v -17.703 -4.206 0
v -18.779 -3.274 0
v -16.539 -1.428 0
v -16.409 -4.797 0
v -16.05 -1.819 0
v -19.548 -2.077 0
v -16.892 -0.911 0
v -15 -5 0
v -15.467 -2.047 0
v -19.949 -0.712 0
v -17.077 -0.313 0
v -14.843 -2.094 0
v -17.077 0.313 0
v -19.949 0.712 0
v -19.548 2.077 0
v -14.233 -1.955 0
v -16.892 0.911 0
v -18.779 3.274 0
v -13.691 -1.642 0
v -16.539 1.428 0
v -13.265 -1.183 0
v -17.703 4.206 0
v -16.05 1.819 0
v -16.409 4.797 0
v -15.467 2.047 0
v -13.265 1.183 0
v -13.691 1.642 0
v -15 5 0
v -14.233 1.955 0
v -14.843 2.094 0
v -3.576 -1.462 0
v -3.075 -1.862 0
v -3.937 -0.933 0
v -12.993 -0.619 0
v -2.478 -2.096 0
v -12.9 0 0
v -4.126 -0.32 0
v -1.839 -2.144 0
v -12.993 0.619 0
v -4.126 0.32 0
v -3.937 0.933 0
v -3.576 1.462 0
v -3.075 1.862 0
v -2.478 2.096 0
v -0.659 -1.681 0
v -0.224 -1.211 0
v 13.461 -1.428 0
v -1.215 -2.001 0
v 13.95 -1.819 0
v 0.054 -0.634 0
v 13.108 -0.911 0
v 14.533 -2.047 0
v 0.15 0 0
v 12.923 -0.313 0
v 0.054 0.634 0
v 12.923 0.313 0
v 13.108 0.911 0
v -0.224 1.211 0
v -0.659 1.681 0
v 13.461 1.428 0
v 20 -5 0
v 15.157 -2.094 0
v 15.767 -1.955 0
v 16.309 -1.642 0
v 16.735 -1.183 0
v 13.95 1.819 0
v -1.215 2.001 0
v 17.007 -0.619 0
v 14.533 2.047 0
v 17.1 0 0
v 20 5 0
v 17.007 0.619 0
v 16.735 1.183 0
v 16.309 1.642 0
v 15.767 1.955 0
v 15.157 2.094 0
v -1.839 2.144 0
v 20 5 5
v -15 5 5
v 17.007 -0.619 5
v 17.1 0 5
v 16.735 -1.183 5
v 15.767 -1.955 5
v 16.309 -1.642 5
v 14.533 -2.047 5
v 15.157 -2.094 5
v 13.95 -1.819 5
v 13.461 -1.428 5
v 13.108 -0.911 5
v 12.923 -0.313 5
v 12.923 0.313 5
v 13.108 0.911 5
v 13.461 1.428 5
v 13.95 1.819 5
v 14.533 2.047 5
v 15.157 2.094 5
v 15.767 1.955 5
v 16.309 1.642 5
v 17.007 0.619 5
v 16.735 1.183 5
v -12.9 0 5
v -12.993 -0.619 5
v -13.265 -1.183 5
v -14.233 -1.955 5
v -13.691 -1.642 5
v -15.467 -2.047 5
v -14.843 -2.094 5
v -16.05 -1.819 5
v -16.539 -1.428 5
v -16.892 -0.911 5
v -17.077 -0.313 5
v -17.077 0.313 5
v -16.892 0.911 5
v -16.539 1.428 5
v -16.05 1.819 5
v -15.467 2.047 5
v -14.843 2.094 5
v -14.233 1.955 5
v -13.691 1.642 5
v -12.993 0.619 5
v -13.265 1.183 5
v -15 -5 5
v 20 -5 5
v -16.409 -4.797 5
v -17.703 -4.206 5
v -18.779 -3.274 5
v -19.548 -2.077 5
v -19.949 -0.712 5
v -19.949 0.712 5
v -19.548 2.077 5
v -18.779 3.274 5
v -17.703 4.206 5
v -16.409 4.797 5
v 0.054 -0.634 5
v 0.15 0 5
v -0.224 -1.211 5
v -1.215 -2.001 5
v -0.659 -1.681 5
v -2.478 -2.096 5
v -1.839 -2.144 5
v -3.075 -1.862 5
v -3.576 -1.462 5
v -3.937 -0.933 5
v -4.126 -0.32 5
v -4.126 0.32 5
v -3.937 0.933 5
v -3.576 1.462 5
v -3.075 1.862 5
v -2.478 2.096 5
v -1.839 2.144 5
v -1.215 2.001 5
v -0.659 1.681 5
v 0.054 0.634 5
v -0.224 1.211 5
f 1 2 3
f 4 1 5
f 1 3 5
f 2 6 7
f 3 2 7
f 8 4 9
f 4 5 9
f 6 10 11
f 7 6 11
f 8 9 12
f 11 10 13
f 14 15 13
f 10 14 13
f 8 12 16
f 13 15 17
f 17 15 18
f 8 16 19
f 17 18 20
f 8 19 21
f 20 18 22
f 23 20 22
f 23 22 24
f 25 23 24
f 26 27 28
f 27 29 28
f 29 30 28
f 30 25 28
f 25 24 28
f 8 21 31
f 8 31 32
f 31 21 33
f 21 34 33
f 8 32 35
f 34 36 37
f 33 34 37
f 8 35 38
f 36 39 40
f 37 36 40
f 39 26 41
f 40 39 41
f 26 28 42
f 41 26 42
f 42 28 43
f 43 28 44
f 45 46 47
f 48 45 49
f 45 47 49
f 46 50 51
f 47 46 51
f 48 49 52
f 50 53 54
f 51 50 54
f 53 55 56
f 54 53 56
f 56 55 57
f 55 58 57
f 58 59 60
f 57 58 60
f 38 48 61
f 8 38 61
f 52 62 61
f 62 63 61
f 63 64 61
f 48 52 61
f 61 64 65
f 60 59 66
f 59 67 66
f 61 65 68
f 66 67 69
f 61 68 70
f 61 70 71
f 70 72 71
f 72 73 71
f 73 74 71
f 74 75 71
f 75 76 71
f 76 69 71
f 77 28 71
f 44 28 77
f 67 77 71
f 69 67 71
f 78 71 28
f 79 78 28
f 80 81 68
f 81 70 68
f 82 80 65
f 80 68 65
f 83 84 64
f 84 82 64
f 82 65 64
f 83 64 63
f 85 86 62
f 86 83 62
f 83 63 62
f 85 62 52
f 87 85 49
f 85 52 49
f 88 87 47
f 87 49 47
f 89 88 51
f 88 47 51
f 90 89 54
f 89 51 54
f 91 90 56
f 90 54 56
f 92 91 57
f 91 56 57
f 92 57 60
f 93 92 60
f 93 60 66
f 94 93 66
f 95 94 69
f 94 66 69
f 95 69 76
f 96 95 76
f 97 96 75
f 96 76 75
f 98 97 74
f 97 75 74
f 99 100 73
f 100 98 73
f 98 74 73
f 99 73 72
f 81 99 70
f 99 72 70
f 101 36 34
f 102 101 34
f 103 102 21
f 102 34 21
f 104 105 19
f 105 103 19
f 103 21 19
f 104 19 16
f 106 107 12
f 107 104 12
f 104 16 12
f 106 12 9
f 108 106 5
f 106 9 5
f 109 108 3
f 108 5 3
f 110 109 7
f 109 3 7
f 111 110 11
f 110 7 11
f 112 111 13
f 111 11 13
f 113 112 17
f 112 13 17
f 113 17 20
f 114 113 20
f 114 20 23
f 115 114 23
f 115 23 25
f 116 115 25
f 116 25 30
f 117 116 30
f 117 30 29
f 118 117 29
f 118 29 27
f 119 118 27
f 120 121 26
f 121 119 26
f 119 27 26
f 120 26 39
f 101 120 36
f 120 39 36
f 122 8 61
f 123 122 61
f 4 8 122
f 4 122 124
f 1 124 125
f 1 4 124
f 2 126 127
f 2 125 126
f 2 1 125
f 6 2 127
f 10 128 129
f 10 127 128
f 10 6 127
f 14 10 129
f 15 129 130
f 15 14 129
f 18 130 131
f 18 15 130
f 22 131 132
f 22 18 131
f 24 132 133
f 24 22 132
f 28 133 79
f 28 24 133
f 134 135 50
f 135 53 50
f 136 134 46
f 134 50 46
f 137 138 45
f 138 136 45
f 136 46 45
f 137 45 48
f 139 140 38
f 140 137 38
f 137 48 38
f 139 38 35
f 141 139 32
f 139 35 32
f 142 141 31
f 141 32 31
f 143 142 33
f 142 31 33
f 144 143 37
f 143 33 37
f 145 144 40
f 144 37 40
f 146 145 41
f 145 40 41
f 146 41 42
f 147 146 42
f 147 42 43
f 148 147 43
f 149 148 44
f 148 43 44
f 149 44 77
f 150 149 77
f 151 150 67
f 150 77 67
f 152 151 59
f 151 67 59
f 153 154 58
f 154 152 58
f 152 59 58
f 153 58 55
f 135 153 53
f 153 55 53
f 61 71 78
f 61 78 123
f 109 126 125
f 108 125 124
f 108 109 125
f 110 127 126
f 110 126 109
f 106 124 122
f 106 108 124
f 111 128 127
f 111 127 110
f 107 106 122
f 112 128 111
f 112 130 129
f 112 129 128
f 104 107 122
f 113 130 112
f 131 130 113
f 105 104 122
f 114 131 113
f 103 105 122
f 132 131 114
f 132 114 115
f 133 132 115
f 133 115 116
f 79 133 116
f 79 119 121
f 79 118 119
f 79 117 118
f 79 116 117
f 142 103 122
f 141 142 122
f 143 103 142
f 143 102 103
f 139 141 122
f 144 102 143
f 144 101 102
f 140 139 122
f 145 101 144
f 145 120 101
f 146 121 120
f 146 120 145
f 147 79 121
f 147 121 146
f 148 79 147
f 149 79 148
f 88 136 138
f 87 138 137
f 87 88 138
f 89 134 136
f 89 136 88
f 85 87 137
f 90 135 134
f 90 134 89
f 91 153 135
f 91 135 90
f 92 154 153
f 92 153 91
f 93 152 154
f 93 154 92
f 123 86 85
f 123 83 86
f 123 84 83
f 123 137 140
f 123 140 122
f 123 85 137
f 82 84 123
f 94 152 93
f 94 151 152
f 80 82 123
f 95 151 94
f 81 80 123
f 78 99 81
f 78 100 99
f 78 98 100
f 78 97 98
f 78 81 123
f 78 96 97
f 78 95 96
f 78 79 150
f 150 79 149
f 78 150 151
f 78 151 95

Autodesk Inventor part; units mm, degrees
ref_plane "YZ Plane" through (0, 0, 0) normal (1, 0, 0) x (0, 1, 0)
ref_plane "XZ Plane" through (0, 0, 0) normal (0, 1, 0) x (-1, 0, 0)
ref_plane "XY Plane" through (0, 0, 0) normal (0, 0, 1) x (1, 0, 0)
sketch "Sketch1" plane through (0, 0, 0) normal (0, 0, 1) x (1, 0, 0)
  line L0 (-15, 0) -> (15, 0) construction
  line L1 (-15, -5) -> (20, -5)
  line L2 (20, 5) -> (-15, 5)
  arc A0 (-15, 5) -> (-15, -5) centre (-15, 0) ccw
  arc A1 (15, -5) -> (15, 5) centre (15, 0) ccw construction
  circle A2 centre (-15, 0) radius 2.1
  circle A3 centre (15, 0) radius 2.1
  circle A4 centre (-2, 0) radius 2.15
  line L3 (20, 5) -> (20, -5)
  point P0 (0, 0)
  point P1 (0, 0)
  dimension "d0" = 5
  dimension "d1" = 4.2
  dimension "d2" = 4.2
  dimension "d3" = 30
  dimension "d6" = 4.3
  dimension "d7" = 17
extrude "Extrusion1" add sketch "Sketch1" along normal blind 5
properties part number "gate-pivot"
